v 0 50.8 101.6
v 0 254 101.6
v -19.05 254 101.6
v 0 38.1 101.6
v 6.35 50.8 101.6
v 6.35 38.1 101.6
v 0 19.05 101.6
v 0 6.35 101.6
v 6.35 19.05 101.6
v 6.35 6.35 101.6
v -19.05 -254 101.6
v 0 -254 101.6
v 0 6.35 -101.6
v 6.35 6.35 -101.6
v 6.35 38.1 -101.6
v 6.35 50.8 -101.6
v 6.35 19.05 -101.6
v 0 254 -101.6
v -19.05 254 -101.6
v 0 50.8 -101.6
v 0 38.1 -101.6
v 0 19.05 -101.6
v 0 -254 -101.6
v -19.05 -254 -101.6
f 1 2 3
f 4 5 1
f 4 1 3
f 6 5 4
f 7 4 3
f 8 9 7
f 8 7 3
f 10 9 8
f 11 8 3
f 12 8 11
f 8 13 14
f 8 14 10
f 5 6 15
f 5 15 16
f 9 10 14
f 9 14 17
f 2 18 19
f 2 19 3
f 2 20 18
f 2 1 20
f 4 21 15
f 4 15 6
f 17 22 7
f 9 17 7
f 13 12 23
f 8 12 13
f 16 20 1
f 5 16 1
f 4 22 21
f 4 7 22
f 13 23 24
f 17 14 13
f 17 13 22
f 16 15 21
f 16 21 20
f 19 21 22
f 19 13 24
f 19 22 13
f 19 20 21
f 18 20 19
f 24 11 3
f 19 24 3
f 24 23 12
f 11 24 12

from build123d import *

# Parameters (mm, degrees)
F0_W     = 203.2
F0_H     = 203.2
F0_W_2   = 19.05
F0_W_3   = 12.7
F0_W_4   = 260.35
F1_DEPTH = 19.05
F2_DEPTH = 6.35


with BuildPart() as f1:
    # F0 (on Right) → F1 (new body)
    with BuildSketch(Plane.YZ):
        with Locations((152.4, 0)):
            Rectangle(F0_W, F0_H)
        with Locations((28.575, 0)):
            Rectangle(F0_W_2, F0_H)
        with Locations((12.7, 0)):
            Rectangle(F0_W_3, F0_H)
        with Locations((-123.825, 0)):
            Rectangle(F0_W_4, F0_H)
        with Locations((44.45, 0)):
            Rectangle(F0_W_3, F0_H)
    extrude(amount=-F1_DEPTH)

    # F0 (on Right) → F2 (join)
    with BuildSketch(Plane.YZ):
        with Locations((44.45, 0)):
            Rectangle(F0_W_3, F0_H)
        with Locations((12.7, 0)):
            Rectangle(F0_W_3, F0_H)
    extrude(amount=F2_DEPTH)


solid = f1.part
